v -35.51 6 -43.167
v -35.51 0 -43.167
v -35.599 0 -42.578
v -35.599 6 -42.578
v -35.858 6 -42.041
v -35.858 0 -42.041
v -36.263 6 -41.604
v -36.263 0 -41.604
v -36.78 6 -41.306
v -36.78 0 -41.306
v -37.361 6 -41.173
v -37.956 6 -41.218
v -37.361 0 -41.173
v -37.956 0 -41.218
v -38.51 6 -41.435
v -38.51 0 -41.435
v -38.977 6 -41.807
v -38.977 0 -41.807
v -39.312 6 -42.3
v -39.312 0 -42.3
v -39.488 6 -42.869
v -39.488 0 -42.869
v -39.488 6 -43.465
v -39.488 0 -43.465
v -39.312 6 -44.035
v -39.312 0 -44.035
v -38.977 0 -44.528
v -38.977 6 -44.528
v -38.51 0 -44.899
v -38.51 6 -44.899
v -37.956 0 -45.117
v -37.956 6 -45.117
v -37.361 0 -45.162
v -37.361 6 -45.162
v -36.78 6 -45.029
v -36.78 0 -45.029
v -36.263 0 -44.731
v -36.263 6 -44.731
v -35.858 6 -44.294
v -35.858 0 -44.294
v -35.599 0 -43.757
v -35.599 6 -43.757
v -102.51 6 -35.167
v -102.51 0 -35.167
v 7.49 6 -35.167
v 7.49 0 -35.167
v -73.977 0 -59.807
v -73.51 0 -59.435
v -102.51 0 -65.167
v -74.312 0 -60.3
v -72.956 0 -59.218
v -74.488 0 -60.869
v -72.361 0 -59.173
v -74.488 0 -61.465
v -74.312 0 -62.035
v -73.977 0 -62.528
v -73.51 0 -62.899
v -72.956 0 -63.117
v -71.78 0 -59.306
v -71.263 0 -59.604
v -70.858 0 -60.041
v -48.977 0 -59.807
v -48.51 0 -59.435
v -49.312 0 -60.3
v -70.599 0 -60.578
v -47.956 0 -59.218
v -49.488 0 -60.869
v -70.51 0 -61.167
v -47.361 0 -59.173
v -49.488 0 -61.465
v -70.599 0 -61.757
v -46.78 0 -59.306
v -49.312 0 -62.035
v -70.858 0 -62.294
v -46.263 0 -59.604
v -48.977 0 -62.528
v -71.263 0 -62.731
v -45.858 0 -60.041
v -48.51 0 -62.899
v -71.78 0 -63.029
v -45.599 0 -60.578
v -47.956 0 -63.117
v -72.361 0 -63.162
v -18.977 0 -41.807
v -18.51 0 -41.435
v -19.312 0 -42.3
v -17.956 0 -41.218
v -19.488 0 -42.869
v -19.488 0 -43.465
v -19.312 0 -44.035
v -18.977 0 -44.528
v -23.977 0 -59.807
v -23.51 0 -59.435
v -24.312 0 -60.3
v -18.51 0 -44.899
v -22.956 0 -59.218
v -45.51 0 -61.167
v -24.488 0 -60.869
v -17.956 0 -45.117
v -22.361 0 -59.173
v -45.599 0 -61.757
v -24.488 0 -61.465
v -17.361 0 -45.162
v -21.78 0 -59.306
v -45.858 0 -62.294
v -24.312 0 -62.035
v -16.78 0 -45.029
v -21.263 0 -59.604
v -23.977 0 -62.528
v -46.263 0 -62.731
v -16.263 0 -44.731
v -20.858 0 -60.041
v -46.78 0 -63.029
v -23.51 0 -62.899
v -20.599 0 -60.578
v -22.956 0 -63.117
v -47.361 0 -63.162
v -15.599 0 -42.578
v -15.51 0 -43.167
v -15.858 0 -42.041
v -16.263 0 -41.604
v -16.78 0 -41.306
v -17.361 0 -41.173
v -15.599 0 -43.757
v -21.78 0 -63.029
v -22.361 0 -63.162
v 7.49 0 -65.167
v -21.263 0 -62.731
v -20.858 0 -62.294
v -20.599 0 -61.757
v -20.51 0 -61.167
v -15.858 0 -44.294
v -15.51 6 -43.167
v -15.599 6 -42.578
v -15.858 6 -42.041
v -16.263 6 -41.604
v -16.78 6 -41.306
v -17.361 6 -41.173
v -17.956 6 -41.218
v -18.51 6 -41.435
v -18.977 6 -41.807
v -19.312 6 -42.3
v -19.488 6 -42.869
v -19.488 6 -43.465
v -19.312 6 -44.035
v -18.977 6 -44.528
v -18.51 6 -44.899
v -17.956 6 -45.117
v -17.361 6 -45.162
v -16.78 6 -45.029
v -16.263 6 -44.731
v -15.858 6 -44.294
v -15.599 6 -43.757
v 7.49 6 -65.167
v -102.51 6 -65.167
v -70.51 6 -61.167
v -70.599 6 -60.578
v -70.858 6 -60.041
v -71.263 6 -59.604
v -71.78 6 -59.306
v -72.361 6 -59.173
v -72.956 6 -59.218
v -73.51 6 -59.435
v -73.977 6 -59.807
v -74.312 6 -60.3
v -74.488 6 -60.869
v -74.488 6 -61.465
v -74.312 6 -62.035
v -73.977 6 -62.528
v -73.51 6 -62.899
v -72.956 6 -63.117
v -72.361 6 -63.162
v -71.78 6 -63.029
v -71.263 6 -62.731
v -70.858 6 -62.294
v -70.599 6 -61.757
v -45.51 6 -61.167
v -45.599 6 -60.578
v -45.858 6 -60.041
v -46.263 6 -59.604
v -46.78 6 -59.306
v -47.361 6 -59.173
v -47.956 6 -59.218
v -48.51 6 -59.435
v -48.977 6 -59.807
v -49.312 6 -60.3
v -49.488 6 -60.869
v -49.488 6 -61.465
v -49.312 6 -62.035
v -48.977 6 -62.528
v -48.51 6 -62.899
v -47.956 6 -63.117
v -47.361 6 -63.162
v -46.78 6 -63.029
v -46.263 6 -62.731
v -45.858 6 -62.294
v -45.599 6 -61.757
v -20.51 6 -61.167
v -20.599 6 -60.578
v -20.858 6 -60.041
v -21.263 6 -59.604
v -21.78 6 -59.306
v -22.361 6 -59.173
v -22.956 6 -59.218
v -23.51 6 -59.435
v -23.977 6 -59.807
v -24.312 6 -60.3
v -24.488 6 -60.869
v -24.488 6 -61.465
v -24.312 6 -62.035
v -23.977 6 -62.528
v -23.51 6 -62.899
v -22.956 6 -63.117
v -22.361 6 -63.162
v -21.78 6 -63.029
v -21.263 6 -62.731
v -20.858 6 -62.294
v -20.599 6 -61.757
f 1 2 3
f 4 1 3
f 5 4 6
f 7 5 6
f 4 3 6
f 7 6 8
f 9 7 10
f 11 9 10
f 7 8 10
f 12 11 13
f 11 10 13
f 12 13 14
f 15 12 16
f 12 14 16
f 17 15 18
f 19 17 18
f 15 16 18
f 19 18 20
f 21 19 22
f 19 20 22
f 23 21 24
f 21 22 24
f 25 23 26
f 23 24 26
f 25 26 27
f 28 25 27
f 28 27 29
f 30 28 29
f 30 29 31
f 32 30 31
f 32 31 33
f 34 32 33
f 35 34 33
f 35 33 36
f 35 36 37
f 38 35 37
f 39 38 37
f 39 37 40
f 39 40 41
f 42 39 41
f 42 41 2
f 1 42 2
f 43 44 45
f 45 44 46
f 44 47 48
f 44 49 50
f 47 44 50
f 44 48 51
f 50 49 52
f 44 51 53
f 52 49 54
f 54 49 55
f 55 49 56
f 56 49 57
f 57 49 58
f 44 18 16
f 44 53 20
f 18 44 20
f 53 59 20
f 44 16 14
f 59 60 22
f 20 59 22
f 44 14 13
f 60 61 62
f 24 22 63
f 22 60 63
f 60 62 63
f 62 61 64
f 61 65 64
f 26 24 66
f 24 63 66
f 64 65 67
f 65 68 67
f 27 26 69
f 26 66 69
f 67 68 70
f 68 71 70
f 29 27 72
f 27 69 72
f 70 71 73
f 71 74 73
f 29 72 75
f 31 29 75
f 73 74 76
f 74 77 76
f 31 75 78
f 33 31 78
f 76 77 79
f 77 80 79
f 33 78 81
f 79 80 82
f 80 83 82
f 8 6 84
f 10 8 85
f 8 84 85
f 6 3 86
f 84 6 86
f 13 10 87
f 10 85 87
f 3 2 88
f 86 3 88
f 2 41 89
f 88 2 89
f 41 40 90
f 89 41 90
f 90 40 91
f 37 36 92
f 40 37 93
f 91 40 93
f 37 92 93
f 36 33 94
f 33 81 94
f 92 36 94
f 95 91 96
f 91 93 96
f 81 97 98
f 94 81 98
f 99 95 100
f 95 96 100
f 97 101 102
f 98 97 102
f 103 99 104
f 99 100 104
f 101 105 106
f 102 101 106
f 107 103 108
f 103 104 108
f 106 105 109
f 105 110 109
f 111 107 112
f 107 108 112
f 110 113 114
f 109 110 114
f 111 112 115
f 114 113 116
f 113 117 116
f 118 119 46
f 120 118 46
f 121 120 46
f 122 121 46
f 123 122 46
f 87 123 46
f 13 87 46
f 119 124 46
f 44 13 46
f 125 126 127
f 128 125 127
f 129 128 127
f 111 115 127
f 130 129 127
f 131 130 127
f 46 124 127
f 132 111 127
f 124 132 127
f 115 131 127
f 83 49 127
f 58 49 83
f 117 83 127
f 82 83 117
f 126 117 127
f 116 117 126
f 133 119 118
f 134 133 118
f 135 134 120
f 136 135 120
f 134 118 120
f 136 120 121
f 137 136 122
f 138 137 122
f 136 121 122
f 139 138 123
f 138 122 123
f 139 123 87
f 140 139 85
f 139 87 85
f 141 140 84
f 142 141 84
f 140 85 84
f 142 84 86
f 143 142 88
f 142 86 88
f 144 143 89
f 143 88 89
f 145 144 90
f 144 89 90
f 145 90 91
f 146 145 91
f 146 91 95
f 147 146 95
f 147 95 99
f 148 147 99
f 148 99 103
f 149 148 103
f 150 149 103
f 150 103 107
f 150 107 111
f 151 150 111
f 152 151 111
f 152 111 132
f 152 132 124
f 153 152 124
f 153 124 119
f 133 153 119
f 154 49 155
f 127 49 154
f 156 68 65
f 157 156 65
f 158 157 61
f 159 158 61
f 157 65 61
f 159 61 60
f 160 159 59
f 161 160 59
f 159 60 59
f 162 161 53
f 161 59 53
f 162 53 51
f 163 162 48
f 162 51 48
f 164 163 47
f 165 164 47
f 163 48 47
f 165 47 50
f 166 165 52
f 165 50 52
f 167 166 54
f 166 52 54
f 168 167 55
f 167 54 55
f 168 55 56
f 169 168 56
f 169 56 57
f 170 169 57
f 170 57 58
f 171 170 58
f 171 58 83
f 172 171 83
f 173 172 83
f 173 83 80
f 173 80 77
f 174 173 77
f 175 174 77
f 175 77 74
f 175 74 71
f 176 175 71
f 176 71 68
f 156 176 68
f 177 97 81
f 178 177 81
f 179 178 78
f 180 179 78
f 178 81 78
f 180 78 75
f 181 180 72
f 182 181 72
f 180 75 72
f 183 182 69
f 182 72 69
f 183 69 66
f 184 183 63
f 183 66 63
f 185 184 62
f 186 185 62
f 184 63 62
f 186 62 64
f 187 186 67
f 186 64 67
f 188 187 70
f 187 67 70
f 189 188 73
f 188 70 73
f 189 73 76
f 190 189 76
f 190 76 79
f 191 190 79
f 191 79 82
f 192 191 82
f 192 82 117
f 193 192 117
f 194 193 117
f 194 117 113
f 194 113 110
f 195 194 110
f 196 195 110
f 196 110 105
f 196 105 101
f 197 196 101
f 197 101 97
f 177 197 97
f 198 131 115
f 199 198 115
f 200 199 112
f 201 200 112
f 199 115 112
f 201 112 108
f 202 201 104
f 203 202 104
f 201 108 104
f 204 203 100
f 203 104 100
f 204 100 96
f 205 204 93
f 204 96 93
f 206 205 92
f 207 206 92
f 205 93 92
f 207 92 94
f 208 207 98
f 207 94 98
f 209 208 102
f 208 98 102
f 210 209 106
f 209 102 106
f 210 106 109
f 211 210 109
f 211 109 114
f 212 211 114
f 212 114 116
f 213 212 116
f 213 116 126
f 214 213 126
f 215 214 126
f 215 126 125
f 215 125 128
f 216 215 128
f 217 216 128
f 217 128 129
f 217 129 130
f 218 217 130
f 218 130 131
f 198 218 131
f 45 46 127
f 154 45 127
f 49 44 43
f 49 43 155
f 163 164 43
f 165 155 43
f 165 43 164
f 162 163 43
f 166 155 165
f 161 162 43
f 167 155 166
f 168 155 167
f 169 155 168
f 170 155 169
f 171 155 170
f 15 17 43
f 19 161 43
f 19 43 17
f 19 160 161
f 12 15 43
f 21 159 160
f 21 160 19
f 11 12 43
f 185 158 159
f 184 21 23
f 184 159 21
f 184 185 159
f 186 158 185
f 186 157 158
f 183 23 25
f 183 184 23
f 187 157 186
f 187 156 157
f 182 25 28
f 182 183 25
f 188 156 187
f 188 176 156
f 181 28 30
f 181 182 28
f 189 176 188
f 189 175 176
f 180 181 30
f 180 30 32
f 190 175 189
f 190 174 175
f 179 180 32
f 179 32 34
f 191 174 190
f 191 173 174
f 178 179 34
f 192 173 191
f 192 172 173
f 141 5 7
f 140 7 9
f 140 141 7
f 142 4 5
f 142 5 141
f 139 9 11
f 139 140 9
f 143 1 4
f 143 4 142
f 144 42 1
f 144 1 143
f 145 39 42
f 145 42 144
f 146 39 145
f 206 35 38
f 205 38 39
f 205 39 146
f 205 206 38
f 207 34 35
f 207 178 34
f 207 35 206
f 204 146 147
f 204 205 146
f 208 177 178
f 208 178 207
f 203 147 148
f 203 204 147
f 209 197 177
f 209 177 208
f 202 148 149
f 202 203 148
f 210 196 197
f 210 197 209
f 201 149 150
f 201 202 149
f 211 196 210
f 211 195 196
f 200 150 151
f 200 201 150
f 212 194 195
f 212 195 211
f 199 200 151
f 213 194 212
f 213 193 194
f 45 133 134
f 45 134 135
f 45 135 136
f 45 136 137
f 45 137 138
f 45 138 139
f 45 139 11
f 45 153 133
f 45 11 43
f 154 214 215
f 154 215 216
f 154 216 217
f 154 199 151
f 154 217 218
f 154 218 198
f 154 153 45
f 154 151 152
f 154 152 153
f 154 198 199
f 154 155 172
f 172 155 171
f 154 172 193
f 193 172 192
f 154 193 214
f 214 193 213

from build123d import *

# Parameters (mm, degrees)
SKETCH1_W           = 110
SKETCH1_H           = 30
BOSS_EXTRUDE1_DEPTH = 6
SKETCH2_R           = 2
CUT_EXTRUDE1_DEPTH  = 10


with BuildPart() as part:
    # Sketch1 → Boss-Extrude1 (new body)
    with BuildSketch(Plane(origin=(0, 0, 0), x_dir=(1, 0, 0), z_dir=(0, 1, 0))):
        with Locations((-47.510460251, 50.167364017)):
            Rectangle(SKETCH1_W, SKETCH1_H)
    extrude(amount=BOSS_EXTRUDE1_DEPTH)

    # Sketch2 → Cut-Extrude1 (cut)
    with BuildSketch(Plane.XZ):
        with Locations((-72.510460251, -61.167364017)):
            Circle(SKETCH2_R)
        with Locations((-47.510460251, -61.167364017)):
            Circle(SKETCH2_R)
        with Locations((-22.510460251, -61.167364017)):
            Circle(SKETCH2_R)
        with Locations((-17.510460251, -43.167364017)):
            Circle(SKETCH2_R)
        with Locations((-37.510460251, -43.167364017)):
            Circle(SKETCH2_R)
    extrude(amount=-CUT_EXTRUDE1_DEPTH, mode=Mode.SUBTRACT)


solid = part.part
